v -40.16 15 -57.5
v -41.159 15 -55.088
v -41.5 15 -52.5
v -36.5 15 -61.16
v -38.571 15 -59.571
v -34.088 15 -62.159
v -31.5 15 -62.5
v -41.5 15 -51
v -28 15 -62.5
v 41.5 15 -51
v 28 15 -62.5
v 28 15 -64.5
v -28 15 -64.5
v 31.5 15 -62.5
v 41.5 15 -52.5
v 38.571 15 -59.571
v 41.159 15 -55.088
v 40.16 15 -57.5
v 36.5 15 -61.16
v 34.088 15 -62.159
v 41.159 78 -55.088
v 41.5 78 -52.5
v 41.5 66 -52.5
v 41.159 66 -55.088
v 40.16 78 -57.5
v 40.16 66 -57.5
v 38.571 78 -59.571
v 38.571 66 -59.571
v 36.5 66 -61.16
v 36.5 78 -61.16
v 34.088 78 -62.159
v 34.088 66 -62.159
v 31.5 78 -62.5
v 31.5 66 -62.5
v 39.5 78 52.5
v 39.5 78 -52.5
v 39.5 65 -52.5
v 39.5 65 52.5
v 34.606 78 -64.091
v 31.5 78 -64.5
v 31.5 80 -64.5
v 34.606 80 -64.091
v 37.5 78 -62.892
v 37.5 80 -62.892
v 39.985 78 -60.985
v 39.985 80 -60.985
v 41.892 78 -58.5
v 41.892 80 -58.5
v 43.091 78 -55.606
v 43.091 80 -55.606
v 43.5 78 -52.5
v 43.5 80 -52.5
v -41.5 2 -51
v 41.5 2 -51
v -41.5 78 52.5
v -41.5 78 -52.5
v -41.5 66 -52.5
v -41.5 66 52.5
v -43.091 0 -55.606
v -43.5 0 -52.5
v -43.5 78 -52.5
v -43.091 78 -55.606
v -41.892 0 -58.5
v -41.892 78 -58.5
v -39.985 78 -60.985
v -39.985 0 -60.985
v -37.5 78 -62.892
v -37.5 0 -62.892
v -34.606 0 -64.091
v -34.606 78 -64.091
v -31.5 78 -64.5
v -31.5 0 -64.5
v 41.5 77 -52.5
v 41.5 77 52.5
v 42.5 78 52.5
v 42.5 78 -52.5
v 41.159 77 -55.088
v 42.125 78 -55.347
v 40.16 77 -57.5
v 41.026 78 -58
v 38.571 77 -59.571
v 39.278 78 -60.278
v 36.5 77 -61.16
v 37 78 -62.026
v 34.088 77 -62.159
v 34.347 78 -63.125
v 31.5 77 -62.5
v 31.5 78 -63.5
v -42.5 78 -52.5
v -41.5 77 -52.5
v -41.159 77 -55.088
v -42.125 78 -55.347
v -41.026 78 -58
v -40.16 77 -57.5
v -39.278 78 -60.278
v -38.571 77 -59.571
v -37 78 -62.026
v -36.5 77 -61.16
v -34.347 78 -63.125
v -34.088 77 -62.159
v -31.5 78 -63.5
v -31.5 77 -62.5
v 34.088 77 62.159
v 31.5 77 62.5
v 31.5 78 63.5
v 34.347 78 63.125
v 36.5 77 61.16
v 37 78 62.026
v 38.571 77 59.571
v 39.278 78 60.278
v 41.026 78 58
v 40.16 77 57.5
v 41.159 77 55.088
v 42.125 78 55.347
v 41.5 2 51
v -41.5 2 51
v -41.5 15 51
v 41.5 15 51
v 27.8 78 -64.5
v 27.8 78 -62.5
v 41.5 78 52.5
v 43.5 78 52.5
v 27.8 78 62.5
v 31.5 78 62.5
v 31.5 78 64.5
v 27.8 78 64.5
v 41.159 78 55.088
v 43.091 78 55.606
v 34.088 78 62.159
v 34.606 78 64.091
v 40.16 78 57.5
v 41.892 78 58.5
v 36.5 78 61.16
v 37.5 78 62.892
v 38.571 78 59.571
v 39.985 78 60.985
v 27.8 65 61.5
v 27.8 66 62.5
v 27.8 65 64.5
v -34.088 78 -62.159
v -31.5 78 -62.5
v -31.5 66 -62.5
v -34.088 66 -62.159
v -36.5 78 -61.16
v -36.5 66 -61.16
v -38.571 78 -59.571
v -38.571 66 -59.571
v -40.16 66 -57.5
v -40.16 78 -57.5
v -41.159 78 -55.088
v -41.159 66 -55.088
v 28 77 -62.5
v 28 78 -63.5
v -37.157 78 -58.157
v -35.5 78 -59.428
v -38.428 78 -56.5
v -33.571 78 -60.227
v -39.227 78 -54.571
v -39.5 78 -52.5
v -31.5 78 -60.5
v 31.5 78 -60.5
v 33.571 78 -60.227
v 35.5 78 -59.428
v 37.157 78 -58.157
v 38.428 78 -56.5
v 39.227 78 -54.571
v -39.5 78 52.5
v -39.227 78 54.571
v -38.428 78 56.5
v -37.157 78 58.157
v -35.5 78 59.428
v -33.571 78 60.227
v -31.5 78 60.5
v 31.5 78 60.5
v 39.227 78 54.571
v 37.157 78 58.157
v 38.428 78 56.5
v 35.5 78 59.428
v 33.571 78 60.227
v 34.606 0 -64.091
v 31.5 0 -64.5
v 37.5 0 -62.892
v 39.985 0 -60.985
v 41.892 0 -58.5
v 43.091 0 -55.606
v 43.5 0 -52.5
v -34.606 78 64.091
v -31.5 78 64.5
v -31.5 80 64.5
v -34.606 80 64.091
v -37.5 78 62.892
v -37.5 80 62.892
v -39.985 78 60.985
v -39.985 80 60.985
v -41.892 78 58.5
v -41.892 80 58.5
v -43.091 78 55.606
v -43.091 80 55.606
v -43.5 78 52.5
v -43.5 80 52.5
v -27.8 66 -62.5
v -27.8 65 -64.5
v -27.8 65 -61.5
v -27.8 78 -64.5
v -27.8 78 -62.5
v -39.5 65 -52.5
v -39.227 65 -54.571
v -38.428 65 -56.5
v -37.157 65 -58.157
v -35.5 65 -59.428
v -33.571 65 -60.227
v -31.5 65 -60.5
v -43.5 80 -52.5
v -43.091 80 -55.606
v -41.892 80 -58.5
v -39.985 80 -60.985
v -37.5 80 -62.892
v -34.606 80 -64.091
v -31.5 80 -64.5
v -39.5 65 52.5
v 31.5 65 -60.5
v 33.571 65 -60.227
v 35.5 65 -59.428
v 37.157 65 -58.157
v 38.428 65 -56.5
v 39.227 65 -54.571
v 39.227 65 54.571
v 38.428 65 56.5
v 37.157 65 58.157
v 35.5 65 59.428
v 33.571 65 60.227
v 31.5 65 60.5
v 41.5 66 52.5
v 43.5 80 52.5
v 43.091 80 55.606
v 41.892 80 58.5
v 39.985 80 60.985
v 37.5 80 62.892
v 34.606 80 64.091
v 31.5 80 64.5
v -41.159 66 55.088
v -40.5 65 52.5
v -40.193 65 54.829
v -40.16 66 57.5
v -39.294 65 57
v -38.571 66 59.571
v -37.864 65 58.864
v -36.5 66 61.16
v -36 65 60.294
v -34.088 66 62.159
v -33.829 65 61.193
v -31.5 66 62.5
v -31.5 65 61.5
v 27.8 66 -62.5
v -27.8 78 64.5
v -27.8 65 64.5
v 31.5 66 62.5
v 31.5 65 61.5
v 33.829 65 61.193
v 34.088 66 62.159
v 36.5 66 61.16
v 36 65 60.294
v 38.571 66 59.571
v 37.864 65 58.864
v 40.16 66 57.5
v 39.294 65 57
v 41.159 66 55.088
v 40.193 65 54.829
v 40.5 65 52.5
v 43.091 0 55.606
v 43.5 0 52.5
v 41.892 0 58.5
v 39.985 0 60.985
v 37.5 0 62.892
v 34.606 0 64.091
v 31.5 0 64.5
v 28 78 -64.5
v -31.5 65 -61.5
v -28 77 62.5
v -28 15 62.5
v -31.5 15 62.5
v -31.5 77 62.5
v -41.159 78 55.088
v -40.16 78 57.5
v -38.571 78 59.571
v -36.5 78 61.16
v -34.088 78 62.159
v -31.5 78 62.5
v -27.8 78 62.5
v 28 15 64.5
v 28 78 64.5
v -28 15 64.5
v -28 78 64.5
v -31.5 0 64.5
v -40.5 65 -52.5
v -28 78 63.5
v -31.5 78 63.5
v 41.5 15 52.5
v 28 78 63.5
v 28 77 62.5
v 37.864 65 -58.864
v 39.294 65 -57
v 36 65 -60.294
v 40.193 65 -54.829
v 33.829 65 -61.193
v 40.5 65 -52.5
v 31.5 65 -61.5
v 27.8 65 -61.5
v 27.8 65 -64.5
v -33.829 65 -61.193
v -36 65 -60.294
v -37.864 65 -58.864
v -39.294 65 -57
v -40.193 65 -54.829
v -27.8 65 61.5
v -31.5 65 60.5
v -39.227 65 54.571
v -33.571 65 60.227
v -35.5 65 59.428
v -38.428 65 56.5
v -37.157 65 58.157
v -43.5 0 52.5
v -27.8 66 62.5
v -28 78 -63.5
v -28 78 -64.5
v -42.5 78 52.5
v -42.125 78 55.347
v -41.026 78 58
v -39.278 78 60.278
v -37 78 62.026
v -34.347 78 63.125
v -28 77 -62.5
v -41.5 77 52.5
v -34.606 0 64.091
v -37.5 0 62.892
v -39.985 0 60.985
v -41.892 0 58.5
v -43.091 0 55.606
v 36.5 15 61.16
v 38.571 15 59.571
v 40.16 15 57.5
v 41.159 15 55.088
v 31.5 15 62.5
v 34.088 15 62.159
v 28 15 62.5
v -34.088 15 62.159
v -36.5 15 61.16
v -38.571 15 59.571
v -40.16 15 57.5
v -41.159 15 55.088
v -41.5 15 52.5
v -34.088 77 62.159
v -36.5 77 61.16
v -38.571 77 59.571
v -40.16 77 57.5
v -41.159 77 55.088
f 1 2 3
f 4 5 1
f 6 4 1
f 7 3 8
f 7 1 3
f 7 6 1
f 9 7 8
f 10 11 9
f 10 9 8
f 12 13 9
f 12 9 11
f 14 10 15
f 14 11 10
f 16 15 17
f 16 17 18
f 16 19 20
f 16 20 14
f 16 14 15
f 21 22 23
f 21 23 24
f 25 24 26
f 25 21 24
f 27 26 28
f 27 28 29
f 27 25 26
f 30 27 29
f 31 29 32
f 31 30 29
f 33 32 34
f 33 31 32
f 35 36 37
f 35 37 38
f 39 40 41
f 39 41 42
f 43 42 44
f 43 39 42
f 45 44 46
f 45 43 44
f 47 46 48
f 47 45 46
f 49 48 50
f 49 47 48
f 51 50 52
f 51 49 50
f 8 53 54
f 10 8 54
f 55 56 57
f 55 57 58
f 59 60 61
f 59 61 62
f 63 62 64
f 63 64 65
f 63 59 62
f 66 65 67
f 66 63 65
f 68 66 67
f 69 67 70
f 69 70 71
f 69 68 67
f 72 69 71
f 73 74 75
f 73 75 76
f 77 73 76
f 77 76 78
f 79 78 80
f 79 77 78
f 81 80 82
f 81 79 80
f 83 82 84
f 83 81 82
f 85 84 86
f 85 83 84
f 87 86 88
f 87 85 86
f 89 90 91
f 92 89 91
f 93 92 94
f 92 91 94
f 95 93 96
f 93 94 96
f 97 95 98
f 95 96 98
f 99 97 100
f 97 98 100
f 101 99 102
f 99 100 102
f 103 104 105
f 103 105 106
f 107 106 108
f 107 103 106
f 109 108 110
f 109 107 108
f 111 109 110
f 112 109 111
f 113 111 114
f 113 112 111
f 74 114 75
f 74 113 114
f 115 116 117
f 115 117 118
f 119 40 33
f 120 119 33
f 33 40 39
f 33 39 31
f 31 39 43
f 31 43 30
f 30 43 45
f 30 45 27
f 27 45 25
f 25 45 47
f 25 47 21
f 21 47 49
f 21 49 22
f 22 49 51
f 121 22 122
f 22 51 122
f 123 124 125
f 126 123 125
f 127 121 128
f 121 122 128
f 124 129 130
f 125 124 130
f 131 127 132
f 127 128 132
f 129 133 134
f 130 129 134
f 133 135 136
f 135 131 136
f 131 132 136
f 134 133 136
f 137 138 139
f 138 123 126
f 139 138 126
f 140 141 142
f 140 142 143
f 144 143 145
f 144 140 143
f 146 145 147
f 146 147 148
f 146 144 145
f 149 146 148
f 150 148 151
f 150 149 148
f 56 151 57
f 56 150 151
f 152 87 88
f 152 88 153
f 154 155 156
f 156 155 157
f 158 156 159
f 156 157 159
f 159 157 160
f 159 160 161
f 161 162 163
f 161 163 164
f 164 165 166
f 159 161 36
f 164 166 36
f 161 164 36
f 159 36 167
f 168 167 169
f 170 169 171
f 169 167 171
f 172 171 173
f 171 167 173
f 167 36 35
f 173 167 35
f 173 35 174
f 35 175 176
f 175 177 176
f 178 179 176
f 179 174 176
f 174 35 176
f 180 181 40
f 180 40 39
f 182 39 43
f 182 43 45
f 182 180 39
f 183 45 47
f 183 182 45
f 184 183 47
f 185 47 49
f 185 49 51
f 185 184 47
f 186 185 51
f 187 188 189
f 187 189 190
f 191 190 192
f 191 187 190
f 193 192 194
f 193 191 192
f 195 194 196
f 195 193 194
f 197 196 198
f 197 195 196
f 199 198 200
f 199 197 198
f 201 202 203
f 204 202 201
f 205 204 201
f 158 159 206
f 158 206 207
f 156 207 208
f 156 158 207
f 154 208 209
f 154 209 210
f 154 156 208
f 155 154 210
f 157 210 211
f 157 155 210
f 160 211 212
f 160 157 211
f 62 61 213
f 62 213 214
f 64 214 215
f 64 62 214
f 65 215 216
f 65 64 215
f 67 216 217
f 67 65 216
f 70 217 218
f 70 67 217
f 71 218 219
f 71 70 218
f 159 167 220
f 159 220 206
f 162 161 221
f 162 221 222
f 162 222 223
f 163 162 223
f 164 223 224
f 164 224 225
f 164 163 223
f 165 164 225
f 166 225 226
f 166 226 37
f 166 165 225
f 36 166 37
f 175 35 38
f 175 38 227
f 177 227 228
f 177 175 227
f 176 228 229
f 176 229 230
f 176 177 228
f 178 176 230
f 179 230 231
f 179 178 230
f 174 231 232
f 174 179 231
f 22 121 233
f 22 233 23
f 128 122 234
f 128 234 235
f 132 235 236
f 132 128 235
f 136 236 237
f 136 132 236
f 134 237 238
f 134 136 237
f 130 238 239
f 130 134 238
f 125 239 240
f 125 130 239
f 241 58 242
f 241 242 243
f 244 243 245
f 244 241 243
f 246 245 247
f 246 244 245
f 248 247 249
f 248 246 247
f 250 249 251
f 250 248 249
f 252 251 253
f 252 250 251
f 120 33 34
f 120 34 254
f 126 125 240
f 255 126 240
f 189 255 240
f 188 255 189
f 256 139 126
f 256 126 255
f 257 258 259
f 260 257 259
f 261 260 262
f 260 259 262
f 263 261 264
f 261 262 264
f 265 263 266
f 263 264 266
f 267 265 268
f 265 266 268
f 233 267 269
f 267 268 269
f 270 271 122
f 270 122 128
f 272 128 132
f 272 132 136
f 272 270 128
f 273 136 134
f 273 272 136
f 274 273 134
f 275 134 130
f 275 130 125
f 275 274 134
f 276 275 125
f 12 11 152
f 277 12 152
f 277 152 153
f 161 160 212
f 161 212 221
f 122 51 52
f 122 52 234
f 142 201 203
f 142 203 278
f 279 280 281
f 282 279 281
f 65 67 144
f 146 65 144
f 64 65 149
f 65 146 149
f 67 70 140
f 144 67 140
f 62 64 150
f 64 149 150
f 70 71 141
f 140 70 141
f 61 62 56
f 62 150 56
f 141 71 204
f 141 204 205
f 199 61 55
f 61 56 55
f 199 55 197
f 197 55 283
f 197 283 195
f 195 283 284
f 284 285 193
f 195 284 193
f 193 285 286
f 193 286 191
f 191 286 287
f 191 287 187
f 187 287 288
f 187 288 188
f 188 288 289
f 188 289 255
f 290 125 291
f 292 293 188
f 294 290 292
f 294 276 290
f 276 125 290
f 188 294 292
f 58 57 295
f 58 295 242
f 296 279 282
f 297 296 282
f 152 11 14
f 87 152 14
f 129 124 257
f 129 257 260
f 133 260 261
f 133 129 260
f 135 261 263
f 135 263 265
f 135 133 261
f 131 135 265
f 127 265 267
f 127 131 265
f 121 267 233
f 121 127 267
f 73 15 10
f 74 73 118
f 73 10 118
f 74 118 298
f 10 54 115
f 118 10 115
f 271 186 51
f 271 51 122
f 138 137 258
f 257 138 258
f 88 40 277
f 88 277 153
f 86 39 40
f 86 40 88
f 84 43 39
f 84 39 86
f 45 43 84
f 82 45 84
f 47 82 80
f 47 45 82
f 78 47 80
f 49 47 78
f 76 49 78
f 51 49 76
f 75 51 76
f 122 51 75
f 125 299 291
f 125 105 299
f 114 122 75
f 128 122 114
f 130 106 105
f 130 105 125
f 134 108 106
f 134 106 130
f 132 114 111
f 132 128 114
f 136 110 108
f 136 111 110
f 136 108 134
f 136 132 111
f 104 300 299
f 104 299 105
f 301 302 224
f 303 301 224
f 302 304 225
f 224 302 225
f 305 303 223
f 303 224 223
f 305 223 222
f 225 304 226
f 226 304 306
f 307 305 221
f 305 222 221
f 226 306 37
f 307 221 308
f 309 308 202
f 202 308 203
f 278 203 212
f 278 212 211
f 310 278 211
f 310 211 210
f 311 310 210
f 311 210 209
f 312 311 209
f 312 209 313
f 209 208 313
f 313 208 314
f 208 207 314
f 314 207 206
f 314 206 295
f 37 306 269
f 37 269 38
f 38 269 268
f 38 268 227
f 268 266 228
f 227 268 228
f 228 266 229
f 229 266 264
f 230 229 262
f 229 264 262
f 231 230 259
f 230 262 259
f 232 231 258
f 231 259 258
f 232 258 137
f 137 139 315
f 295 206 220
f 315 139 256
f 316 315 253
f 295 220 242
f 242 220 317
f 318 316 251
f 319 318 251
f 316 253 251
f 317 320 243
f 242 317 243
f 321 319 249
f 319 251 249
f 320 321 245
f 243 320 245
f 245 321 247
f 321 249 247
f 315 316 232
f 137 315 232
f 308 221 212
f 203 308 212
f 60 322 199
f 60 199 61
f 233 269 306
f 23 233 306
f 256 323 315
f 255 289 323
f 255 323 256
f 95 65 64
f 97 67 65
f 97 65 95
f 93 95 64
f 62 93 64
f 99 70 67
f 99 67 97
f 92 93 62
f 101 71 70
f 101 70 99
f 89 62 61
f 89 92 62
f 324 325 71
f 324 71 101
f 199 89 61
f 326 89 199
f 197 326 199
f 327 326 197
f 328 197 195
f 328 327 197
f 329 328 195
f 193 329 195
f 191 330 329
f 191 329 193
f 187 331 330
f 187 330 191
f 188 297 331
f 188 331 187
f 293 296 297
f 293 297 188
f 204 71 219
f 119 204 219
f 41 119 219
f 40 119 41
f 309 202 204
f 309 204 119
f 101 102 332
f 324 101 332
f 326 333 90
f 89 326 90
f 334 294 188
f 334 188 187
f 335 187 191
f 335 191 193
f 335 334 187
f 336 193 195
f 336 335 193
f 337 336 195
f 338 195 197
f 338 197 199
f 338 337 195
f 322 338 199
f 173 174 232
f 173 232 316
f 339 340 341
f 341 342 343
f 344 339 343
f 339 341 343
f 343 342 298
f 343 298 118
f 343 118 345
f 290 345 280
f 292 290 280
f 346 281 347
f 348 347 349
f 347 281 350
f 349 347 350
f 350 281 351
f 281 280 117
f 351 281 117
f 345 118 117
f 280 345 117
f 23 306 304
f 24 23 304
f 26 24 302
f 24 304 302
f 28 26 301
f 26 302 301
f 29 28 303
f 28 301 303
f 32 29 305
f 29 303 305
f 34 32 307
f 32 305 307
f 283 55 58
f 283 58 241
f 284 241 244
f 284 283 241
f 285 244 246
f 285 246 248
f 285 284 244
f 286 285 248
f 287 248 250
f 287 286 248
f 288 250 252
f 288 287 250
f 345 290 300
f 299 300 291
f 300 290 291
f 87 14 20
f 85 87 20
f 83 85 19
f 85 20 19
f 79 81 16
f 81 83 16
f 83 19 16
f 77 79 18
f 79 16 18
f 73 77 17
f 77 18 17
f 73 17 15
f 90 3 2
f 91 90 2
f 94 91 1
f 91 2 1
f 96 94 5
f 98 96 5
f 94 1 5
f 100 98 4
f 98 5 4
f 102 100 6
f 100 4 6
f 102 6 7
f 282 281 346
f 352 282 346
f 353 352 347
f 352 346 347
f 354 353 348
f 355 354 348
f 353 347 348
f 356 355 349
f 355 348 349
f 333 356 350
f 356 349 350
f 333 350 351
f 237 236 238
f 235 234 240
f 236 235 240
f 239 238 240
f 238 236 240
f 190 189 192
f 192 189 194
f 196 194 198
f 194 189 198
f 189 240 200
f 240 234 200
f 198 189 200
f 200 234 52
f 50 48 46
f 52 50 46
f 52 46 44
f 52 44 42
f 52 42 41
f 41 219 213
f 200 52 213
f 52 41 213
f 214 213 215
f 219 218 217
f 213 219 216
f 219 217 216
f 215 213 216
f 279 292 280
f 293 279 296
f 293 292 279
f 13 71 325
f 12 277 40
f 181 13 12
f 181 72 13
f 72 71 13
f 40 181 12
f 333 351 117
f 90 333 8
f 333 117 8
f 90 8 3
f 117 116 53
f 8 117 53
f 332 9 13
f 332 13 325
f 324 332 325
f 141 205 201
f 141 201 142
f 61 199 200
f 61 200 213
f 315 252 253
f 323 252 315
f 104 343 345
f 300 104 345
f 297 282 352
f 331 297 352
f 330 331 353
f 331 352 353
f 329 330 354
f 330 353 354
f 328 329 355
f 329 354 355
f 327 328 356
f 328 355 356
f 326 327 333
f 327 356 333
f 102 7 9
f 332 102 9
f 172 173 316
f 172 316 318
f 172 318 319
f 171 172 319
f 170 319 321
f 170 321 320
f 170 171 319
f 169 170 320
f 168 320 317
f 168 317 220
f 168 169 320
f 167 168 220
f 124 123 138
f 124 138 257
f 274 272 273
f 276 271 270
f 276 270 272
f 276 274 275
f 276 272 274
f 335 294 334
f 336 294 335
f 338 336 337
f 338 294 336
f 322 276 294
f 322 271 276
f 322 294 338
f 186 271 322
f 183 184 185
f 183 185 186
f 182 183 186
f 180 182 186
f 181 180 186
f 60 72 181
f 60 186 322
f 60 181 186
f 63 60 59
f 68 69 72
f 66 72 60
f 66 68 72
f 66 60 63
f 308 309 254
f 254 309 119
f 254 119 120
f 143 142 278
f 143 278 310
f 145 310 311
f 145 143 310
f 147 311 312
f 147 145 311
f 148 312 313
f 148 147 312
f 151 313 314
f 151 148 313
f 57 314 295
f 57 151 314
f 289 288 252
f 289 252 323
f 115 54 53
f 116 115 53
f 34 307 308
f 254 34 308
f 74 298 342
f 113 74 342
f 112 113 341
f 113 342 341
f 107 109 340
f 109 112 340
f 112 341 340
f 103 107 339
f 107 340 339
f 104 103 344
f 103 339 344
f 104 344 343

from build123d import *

# Parameters (mm, degrees)
BOSS_EXTRUDE1_DEPTH = 80
SHELL1_T            = -2
SKETCH2_W           = 83
SKETCH2_H           = 1.5
BOSS_EXTRUDE2_DEPTH = 13
SKETCH4_W           = 55.6
SKETCH4_H           = 2
BOSS_EXTRUDE3_DEPTH = 13
CHAMFER1_SIZE       = 1
SKETCH3_W           = 56
SKETCH3_H           = 63
CUT_EXTRUDE1_DEPTH  = 158.902659889
CHAMFER2_SIZE       = 1


with BuildPart() as part:
    # Sketch1 → Boss-Extrude1 (new body)
    with BuildSketch(Plane(origin=(0, 0, 0), x_dir=(1, 0, 0), z_dir=(0, 1, 0))):
        with BuildLine():
            Line((43.5, 52.5), (43.5, -52.5))
            ThreePointArc((43.5, -52.5), (39.985281374, -60.985281374), (31.5, -64.5))
            Line((31.5, -64.5), (-31.5, -64.5))
            ThreePointArc((-31.5, -64.5), (-39.985281374, -60.985281374), (-43.5, -52.5))
            Line((-43.5, -52.5), (-43.5, 52.5))
            ThreePointArc((-43.5, 52.5), (-39.985281374, 60.985281374), (-31.5, 64.5))
            Line((-31.5, 64.5), (31.5, 64.5))
            ThreePointArc((31.5, 64.5), (39.985281374, 60.985281374), (43.5, 52.5))
        make_face()
    extrude(amount=BOSS_EXTRUDE1_DEPTH)


with BuildPart() as body_2:
    # Split1: the piece on the far side of the plane
    add(part.part)
    split(bisect_by=Plane.ZX.offset(78), keep=Keep.BOTTOM)

    # Shell1
    shell1_openings = [body_2.faces().sort_by_distance(p)[0] for p in [
        (0, 78, 0),
    ]]
    offset(amount=SHELL1_T, openings=shell1_openings, kind=Kind.INTERSECTION)

    # Sketch2 → Boss-Extrude2 (add)
    with BuildSketch(Plane(origin=(0, 2, 0), x_dir=(1, 0, 0), z_dir=(0, 1, 0))):
        with Locations((0, 51.75)):
            Rectangle(SKETCH2_W, SKETCH2_H)
        with BuildLine():
            Line((-41.5, 52.5), (41.5, 52.5))
            ThreePointArc((41.5, 52.5), (38.571067812, 59.571067812), (31.5, 62.5))
            Line((31.5, 62.5), (-31.5, 62.5))
            ThreePointArc((-31.5, 62.5), (-38.571067812, 59.571067812), (-41.5, 52.5))
        make_face()
        with BuildLine():
            Line((-41.5, -52.5), (41.5, -52.5))
            ThreePointArc((41.5, -52.5), (38.571067812, -59.571067812), (31.5, -62.5))
            Line((31.5, -62.5), (-31.5, -62.5))
            ThreePointArc((-31.5, -62.5), (-38.571067812, -59.571067812), (-41.5, -52.5))
        make_face()
        with Locations((0, -51.75)):
            Rectangle(SKETCH2_W, SKETCH2_H)
    extrude(amount=BOSS_EXTRUDE2_DEPTH)

    # Sketch3 → Cut-Extrude1 (cut, through all)
    with BuildSketch(Plane.XY.offset(64.5)):
        with Locations((0, 46.5)):
            Rectangle(SKETCH3_W, SKETCH3_H)
    extrude(amount=-CUT_EXTRUDE1_DEPTH, mode=Mode.SUBTRACT)

    # Chamfer2
    chamfer2_edges = [body_2.edges().sort_by_distance(p)[0] for p in [
        (41.5, 78, 0),
        (38.571067812, 78, -59.571067812),
        (29.75, 78, -62.5),
        (-38.571067812, 78, -59.571067812),
        (-41.5, 78, 0),
        (-38.571067812, 78, 59.571067812),
        (-29.75, 78, 62.5),
        (38.571067812, 78, 59.571067812),
        (29.75, 78, 62.5),
        (-29.75, 78, -62.5),
    ]]
    chamfer(chamfer2_edges, length=CHAMFER2_SIZE)


with BuildPart() as part_1:
    add(part.part)

    # Split1
    split(bisect_by=Plane.ZX.offset(78), keep=Keep.TOP)

    # Sketch4 → Boss-Extrude3 (add)
    # profile 1 of 3: a face of its own
    with BuildSketch(Plane.XZ.offset(-78)):
        with BuildLine():
            Line((31.5, -62.5), (-31.5, -62.5))
            ThreePointArc((-31.5, -62.5), (-38.571067812, -59.571067812), (-41.5, -52.5))
            Line((-41.5, -52.5), (-41.5, 52.5))
            ThreePointArc((-41.5, 52.5), (-38.571067812, 59.571067812), (-31.5, 62.5))
            Line((-31.5, 62.5), (31.5, 62.5))
            ThreePointArc((31.5, 62.5), (38.571067812, 59.571067812), (41.5, 52.5))
            Line((41.5, 52.5), (41.5, -52.5))
            ThreePointArc((41.5, -52.5), (38.571067812, -59.571067812), (31.5, -62.5))
        make_face()
        with BuildLine():
            ThreePointArc((39.5, 52.5), (37.156854249, 58.156854249), (31.5, 60.5))
            Line((31.5, 60.5), (-31.5, 60.5))
            ThreePointArc((-31.5, 60.5), (-37.156854249, 58.156854249), (-39.5, 52.5))
            Line((-39.5, 52.5), (-39.5, -52.5))
            ThreePointArc((-39.5, -52.5), (-37.156854249, -58.156854249), (-31.5, -60.5))
            Line((-31.5, -60.5), (31.5, -60.5))
            ThreePointArc((31.5, -60.5), (37.156854249, -58.156854249), (39.5, -52.5))
            Line((39.5, -52.5), (39.5, 52.5))
        make_face(mode=Mode.SUBTRACT)
    # profile 2 of 3: a face of its own
    with BuildSketch(Plane.XZ.offset(-78)):
        with Locations((0, 63.5)):
            Rectangle(SKETCH4_W, SKETCH4_H)
    # profile 3 of 3: a face of its own
    with BuildSketch(Plane.XZ.offset(-78)):
        with Locations((0, -63.5)):
            Rectangle(SKETCH4_W, SKETCH4_H)
    extrude(amount=BOSS_EXTRUDE3_DEPTH)

    # Chamfer1
    chamfer1_edges = [part_1.edges().sort_by_distance(p)[0] for p in [
        (29.65, 65, -62.5),
        (41.5, 65, 0),
        (29.65, 65, 62.5),
        (-29.65, 65, 62.5),
        (-41.5, 65, 0),
        (-29.65, 65, -62.5),
        (38.571067812, 65, -59.571067812),
        (38.571067812, 65, 59.571067812),
        (-38.571067812, 65, 59.571067812),
        (-38.571067812, 65, -59.571067812),
    ]]
    chamfer(chamfer1_edges, length=CHAMFER1_SIZE)


solid = Compound([body_2.part, part_1.part])
